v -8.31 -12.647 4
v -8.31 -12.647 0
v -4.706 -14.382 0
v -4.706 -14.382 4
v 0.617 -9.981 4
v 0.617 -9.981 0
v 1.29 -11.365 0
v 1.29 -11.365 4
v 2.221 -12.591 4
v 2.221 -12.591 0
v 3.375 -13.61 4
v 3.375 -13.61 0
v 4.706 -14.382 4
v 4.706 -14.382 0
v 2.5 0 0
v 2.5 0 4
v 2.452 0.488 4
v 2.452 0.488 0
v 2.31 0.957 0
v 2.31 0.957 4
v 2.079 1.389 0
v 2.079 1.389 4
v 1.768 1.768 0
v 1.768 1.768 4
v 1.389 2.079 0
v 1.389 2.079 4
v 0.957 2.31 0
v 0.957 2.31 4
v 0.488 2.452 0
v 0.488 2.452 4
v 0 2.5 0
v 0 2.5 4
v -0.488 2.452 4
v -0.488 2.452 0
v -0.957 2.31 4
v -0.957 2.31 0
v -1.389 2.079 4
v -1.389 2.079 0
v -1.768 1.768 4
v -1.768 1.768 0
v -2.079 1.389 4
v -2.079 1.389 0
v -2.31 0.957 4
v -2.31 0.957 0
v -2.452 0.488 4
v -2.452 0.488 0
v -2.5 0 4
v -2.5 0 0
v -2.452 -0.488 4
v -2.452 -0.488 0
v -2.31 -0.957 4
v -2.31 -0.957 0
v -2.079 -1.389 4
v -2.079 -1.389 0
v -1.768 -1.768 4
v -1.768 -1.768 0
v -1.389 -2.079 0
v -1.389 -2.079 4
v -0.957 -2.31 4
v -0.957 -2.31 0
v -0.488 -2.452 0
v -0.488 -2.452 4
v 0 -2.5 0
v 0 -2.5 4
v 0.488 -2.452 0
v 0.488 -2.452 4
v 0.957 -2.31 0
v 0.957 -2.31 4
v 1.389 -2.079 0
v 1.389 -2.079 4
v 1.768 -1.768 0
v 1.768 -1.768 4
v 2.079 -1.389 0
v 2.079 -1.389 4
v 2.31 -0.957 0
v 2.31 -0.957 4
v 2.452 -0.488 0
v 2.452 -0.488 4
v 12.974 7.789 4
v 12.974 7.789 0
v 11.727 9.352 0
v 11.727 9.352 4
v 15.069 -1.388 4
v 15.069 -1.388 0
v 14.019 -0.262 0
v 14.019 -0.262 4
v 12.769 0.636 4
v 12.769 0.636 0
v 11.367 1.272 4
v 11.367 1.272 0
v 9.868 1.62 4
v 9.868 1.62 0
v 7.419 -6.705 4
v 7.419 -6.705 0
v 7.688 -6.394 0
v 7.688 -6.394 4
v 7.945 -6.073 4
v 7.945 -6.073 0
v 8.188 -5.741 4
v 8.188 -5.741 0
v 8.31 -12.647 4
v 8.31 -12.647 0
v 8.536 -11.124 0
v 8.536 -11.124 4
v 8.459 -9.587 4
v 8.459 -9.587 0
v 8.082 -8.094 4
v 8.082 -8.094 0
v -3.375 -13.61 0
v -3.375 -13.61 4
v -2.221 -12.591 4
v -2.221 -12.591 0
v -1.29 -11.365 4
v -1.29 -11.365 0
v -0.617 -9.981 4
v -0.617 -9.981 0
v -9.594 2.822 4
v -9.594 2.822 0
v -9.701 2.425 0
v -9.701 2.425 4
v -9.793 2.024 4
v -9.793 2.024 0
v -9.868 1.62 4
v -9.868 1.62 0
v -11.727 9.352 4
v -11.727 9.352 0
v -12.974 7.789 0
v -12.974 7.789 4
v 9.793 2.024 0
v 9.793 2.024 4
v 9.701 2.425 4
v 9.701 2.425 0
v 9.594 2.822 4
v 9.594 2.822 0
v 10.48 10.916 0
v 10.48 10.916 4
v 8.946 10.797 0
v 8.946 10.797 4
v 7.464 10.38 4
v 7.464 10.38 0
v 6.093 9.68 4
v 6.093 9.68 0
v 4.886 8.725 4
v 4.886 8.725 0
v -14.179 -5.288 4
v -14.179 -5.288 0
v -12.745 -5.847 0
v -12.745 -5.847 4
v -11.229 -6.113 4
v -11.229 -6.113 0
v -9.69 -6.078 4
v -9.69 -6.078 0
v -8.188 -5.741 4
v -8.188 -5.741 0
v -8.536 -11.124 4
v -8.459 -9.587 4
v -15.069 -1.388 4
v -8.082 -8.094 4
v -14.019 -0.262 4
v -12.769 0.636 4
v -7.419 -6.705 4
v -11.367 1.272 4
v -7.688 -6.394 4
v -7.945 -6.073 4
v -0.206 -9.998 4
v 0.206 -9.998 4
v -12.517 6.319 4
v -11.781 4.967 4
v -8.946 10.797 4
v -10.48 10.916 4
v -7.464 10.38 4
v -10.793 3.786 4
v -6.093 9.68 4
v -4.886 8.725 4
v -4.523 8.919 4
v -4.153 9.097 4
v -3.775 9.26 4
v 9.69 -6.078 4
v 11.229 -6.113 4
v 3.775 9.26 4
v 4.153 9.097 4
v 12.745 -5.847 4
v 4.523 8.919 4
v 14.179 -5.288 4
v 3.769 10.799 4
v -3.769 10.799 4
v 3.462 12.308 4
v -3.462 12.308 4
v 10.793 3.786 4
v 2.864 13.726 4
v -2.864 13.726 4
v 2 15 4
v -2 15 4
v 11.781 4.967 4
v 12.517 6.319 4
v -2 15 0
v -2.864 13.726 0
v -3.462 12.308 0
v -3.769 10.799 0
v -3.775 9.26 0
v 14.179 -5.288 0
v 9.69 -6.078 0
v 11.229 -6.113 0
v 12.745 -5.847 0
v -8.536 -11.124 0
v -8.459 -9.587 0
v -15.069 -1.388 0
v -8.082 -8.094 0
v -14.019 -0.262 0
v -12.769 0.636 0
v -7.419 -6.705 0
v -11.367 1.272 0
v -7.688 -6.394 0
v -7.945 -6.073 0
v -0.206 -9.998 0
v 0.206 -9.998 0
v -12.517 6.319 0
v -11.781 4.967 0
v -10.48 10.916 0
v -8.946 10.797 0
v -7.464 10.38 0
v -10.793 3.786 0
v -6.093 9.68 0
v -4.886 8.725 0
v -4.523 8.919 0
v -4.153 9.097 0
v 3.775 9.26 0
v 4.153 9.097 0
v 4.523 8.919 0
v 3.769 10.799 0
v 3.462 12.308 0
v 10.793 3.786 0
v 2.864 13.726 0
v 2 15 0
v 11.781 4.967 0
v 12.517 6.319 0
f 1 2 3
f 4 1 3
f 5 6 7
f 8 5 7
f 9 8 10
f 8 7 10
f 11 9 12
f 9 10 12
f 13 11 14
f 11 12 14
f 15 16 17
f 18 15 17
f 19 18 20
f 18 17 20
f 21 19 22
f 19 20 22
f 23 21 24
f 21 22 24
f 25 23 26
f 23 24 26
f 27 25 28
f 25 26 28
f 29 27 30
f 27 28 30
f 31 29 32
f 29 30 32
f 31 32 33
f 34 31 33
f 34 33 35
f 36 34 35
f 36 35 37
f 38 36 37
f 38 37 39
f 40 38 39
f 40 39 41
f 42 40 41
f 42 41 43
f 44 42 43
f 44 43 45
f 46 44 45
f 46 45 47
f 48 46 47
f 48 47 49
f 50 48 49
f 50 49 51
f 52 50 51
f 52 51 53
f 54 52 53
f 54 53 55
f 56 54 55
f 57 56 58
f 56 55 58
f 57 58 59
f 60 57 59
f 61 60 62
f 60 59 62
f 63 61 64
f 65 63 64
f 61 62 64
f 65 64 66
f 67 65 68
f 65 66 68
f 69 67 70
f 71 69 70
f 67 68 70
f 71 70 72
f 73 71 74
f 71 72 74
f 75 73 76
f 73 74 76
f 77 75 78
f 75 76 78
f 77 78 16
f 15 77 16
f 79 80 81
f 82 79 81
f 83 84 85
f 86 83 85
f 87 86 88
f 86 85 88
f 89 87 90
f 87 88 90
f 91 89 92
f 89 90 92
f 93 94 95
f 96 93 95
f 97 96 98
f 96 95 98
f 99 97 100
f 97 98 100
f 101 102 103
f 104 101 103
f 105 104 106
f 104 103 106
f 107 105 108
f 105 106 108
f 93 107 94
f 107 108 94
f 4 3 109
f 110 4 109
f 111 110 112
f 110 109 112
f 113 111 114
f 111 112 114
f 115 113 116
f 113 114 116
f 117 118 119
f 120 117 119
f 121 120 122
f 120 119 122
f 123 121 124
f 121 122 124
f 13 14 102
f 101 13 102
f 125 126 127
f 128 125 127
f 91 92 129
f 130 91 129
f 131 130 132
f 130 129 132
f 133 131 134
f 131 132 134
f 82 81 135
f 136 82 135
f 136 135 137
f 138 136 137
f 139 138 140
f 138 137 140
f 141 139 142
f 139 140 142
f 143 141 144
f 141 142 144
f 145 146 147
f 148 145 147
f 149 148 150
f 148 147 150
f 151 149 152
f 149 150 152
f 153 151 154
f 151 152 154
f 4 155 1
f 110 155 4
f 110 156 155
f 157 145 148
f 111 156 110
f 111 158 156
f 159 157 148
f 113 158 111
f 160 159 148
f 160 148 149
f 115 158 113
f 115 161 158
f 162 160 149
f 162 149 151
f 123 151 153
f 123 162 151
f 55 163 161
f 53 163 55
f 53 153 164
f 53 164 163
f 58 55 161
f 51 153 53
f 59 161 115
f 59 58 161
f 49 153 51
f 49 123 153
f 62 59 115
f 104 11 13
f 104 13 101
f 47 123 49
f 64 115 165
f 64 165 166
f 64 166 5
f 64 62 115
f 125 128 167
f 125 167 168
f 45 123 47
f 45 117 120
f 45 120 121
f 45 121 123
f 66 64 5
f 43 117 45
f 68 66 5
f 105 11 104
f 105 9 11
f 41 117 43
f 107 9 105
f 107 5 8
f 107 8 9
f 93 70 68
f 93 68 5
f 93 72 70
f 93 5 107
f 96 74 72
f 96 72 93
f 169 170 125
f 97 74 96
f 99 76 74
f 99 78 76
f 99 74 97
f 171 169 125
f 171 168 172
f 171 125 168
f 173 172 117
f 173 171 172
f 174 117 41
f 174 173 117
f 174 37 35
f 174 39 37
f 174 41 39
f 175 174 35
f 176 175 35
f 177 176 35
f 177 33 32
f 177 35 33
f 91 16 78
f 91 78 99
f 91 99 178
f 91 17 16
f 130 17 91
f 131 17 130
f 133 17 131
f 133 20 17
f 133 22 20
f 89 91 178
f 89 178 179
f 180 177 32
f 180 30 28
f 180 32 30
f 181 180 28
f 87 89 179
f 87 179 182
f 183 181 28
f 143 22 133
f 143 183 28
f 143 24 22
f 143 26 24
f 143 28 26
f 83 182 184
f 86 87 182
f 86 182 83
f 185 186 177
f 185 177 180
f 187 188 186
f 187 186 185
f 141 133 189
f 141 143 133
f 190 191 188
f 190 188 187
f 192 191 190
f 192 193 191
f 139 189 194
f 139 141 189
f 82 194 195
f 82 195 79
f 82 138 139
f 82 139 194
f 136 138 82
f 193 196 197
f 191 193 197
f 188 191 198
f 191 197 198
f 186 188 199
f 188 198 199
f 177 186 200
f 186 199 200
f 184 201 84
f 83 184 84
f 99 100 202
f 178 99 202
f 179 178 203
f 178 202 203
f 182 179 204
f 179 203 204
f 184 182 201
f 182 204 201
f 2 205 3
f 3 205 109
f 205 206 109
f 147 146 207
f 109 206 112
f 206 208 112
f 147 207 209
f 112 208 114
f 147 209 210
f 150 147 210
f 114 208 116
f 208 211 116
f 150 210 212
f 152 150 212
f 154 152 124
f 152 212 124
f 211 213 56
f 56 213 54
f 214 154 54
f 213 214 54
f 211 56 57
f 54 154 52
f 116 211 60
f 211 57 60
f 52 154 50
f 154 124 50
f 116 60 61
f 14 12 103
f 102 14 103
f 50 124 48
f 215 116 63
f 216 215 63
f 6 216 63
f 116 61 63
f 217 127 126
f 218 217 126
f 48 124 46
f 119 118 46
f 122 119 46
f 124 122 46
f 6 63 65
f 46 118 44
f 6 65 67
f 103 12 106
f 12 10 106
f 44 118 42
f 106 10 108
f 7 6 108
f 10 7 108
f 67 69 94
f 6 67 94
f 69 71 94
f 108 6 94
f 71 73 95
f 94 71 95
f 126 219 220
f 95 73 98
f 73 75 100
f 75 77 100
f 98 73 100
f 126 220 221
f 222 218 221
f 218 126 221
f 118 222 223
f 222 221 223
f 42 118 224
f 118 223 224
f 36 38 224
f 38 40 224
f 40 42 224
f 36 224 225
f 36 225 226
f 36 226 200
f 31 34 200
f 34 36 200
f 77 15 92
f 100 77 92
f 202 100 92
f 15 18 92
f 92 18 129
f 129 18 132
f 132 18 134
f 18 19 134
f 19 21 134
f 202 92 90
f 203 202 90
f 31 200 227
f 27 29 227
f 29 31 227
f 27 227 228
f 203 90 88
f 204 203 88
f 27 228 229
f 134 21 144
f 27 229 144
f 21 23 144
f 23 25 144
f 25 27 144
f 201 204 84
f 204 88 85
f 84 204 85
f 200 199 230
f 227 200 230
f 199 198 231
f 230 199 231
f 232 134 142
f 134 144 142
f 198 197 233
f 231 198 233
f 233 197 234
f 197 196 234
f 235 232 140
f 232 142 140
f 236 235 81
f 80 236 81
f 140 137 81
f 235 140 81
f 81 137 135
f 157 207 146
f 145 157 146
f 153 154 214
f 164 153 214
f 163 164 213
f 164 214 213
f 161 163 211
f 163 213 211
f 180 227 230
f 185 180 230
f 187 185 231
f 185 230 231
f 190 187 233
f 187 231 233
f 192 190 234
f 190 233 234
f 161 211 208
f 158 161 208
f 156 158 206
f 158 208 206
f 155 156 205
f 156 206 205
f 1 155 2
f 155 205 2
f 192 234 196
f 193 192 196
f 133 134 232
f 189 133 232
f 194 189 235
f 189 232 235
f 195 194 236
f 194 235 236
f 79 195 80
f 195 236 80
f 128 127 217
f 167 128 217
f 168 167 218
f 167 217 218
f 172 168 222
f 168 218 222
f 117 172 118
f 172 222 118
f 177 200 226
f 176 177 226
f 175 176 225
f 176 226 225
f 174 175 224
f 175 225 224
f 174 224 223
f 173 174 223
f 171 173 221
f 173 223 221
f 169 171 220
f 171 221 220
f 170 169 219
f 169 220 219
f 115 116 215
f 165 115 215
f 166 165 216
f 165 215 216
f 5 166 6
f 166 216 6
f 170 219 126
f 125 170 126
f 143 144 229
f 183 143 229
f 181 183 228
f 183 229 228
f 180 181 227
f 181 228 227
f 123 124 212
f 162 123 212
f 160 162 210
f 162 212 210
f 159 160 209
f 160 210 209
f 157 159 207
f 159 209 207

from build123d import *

# Parameters (mm, degrees)
F1_DEPTH = 4
F2_R     = 2.5
F3_DEPTH = 4.001


with BuildPart() as f1:
    # F0 (on Top) → F1 (new body)
    with BuildSketch(Plane.XY):
        with BuildLine():
            ThreePointArc((8.187836, -5.741023), (9.536204, -3.01012), (10, 0))
            ThreePointArc((10, 0), (9.966926, 0.812645), (9.867922, 1.619914))
            ThreePointArc((9.867922, 1.619914), (9.749279, 2.225209), (9.593545, 2.822039))
            ThreePointArc((9.593545, 2.822039), (7.818315, 6.234898), (4.886049, 8.725052))
            ThreePointArc((4.886049, 8.725052), (4.338837, 9.009689), (3.775119, 9.260047))
            ThreePointArc((3.775119, 9.260047), (0, 10), (-3.775119, 9.260047))
            ThreePointArc((-3.775119, 9.260047), (-4.338837, 9.009689), (-4.886049, 8.725052))
            ThreePointArc((-4.886049, 8.725052), (-7.818315, 6.234898), (-9.593545, 2.822039))
            ThreePointArc((-9.593545, 2.822039), (-9.749279, 2.225209), (-9.867922, 1.619914))
            ThreePointArc((-9.867922, 1.619914), (-9.749279, -2.225209), (-8.187836, -5.741023))
            ThreePointArc((-8.187836, -5.741023), (-7.818315, -6.234898), (-7.419048, -6.705052))
            ThreePointArc((-7.419048, -6.705052), (-4.338837, -9.009689), (-0.61652, -9.980977))
            ThreePointArc((-0.61652, -9.980977), (0, -10), (0.61652, -9.980977))
            ThreePointArc((0.61652, -9.980977), (4.338837, -9.009689), (7.419048, -6.705052))
            ThreePointArc((7.419048, -6.705052), (7.818315, -6.234898), (8.187836, -5.741023))
        make_face()
        with BuildLine():
            ThreePointArc((9.867922, 1.619914), (9.966926, 0.812645), (10, 0))
            ThreePointArc((10, 0), (9.536204, -3.01012), (8.187836, -5.741023))
            ThreePointArc((8.187836, -5.741023), (11.228694, -6.113481), (14.178877, -5.28767))
            Line((14.178877, -5.28767), (14.623919, -3.337814))
            Line((14.623919, -3.337814), (15.068961, -1.387958))
            ThreePointArc((15.068961, -1.387958), (12.769244, 0.636109), (9.867922, 1.619914))
        make_face()
        with BuildLine():
            ThreePointArc((4.886049, 8.725052), (7.818315, 6.234898), (9.593545, 2.822039))
            ThreePointArc((9.593545, 2.822039), (11.780688, 4.967253), (12.974452, 7.788684))
            Line((12.974452, 7.788684), (11.727472, 9.352347))
            Line((11.727472, 9.352347), (10.480493, 10.91601))
            ThreePointArc((10.480493, 10.91601), (7.464164, 10.380004), (4.886049, 8.725052))
        make_face()
        with BuildLine():
            ThreePointArc((8.310194, -12.646766), (8.458823, -9.58679), (7.419048, -6.705052))
            ThreePointArc((7.419048, -6.705052), (4.338837, -9.009689), (0.61652, -9.980977))
            ThreePointArc((0.61652, -9.980977), (2.221264, -12.59064), (4.706318, -14.3823))
            Line((4.706318, -14.3823), (6.508256, -13.514533))
            Line((6.508256, -13.514533), (8.310194, -12.646766))
        make_face()
        with BuildLine():
            ThreePointArc((-3.775119, 9.260047), (0, 10), (3.775119, 9.260047))
            ThreePointArc((3.775119, 9.260047), (3.461584, 12.307545), (2, 15))
            Line((2, 15), (0, 15))
            Line((0, 15), (-2, 15))
            ThreePointArc((-2, 15), (-3.461584, 12.307545), (-3.775119, 9.260047))
        make_face()
        with BuildLine():
            ThreePointArc((-4.706318, -14.3823), (-2.221264, -12.59064), (-0.61652, -9.980977))
            ThreePointArc((-0.61652, -9.980977), (-4.338837, -9.009689), (-7.419048, -6.705052))
            ThreePointArc((-7.419048, -6.705052), (-8.458823, -9.58679), (-8.310194, -12.646766))
            Line((-8.310194, -12.646766), (-6.508256, -13.514533))
            Line((-6.508256, -13.514533), (-4.706318, -14.3823))
        make_face()
        with BuildLine():
            ThreePointArc((-9.593545, 2.822039), (-7.818315, 6.234898), (-4.886049, 8.725052))
            ThreePointArc((-4.886049, 8.725052), (-7.464164, 10.380004), (-10.480493, 10.91601))
            Line((-10.480493, 10.91601), (-11.727472, 9.352347))
            Line((-11.727472, 9.352347), (-12.974452, 7.788684))
            ThreePointArc((-12.974452, 7.788684), (-11.780688, 4.967253), (-9.593545, 2.822039))
        make_face()
        with BuildLine():
            ThreePointArc((-14.178877, -5.28767), (-11.228694, -6.113481), (-8.187836, -5.741023))
            ThreePointArc((-8.187836, -5.741023), (-9.749279, -2.225209), (-9.867922, 1.619914))
            ThreePointArc((-9.867922, 1.619914), (-12.769244, 0.636109), (-15.068961, -1.387958))
            Line((-15.068961, -1.387958), (-14.623919, -3.337814))
            Line((-14.623919, -3.337814), (-14.178877, -5.28767))
        make_face()
    extrude(amount=F1_DEPTH)

    # F2 (on face) → F3 (cut, through all)
    with BuildSketch(Plane.XY.offset(4)):
        Circle(F2_R)
    extrude(amount=-F3_DEPTH, mode=Mode.SUBTRACT)


solid = f1.part
